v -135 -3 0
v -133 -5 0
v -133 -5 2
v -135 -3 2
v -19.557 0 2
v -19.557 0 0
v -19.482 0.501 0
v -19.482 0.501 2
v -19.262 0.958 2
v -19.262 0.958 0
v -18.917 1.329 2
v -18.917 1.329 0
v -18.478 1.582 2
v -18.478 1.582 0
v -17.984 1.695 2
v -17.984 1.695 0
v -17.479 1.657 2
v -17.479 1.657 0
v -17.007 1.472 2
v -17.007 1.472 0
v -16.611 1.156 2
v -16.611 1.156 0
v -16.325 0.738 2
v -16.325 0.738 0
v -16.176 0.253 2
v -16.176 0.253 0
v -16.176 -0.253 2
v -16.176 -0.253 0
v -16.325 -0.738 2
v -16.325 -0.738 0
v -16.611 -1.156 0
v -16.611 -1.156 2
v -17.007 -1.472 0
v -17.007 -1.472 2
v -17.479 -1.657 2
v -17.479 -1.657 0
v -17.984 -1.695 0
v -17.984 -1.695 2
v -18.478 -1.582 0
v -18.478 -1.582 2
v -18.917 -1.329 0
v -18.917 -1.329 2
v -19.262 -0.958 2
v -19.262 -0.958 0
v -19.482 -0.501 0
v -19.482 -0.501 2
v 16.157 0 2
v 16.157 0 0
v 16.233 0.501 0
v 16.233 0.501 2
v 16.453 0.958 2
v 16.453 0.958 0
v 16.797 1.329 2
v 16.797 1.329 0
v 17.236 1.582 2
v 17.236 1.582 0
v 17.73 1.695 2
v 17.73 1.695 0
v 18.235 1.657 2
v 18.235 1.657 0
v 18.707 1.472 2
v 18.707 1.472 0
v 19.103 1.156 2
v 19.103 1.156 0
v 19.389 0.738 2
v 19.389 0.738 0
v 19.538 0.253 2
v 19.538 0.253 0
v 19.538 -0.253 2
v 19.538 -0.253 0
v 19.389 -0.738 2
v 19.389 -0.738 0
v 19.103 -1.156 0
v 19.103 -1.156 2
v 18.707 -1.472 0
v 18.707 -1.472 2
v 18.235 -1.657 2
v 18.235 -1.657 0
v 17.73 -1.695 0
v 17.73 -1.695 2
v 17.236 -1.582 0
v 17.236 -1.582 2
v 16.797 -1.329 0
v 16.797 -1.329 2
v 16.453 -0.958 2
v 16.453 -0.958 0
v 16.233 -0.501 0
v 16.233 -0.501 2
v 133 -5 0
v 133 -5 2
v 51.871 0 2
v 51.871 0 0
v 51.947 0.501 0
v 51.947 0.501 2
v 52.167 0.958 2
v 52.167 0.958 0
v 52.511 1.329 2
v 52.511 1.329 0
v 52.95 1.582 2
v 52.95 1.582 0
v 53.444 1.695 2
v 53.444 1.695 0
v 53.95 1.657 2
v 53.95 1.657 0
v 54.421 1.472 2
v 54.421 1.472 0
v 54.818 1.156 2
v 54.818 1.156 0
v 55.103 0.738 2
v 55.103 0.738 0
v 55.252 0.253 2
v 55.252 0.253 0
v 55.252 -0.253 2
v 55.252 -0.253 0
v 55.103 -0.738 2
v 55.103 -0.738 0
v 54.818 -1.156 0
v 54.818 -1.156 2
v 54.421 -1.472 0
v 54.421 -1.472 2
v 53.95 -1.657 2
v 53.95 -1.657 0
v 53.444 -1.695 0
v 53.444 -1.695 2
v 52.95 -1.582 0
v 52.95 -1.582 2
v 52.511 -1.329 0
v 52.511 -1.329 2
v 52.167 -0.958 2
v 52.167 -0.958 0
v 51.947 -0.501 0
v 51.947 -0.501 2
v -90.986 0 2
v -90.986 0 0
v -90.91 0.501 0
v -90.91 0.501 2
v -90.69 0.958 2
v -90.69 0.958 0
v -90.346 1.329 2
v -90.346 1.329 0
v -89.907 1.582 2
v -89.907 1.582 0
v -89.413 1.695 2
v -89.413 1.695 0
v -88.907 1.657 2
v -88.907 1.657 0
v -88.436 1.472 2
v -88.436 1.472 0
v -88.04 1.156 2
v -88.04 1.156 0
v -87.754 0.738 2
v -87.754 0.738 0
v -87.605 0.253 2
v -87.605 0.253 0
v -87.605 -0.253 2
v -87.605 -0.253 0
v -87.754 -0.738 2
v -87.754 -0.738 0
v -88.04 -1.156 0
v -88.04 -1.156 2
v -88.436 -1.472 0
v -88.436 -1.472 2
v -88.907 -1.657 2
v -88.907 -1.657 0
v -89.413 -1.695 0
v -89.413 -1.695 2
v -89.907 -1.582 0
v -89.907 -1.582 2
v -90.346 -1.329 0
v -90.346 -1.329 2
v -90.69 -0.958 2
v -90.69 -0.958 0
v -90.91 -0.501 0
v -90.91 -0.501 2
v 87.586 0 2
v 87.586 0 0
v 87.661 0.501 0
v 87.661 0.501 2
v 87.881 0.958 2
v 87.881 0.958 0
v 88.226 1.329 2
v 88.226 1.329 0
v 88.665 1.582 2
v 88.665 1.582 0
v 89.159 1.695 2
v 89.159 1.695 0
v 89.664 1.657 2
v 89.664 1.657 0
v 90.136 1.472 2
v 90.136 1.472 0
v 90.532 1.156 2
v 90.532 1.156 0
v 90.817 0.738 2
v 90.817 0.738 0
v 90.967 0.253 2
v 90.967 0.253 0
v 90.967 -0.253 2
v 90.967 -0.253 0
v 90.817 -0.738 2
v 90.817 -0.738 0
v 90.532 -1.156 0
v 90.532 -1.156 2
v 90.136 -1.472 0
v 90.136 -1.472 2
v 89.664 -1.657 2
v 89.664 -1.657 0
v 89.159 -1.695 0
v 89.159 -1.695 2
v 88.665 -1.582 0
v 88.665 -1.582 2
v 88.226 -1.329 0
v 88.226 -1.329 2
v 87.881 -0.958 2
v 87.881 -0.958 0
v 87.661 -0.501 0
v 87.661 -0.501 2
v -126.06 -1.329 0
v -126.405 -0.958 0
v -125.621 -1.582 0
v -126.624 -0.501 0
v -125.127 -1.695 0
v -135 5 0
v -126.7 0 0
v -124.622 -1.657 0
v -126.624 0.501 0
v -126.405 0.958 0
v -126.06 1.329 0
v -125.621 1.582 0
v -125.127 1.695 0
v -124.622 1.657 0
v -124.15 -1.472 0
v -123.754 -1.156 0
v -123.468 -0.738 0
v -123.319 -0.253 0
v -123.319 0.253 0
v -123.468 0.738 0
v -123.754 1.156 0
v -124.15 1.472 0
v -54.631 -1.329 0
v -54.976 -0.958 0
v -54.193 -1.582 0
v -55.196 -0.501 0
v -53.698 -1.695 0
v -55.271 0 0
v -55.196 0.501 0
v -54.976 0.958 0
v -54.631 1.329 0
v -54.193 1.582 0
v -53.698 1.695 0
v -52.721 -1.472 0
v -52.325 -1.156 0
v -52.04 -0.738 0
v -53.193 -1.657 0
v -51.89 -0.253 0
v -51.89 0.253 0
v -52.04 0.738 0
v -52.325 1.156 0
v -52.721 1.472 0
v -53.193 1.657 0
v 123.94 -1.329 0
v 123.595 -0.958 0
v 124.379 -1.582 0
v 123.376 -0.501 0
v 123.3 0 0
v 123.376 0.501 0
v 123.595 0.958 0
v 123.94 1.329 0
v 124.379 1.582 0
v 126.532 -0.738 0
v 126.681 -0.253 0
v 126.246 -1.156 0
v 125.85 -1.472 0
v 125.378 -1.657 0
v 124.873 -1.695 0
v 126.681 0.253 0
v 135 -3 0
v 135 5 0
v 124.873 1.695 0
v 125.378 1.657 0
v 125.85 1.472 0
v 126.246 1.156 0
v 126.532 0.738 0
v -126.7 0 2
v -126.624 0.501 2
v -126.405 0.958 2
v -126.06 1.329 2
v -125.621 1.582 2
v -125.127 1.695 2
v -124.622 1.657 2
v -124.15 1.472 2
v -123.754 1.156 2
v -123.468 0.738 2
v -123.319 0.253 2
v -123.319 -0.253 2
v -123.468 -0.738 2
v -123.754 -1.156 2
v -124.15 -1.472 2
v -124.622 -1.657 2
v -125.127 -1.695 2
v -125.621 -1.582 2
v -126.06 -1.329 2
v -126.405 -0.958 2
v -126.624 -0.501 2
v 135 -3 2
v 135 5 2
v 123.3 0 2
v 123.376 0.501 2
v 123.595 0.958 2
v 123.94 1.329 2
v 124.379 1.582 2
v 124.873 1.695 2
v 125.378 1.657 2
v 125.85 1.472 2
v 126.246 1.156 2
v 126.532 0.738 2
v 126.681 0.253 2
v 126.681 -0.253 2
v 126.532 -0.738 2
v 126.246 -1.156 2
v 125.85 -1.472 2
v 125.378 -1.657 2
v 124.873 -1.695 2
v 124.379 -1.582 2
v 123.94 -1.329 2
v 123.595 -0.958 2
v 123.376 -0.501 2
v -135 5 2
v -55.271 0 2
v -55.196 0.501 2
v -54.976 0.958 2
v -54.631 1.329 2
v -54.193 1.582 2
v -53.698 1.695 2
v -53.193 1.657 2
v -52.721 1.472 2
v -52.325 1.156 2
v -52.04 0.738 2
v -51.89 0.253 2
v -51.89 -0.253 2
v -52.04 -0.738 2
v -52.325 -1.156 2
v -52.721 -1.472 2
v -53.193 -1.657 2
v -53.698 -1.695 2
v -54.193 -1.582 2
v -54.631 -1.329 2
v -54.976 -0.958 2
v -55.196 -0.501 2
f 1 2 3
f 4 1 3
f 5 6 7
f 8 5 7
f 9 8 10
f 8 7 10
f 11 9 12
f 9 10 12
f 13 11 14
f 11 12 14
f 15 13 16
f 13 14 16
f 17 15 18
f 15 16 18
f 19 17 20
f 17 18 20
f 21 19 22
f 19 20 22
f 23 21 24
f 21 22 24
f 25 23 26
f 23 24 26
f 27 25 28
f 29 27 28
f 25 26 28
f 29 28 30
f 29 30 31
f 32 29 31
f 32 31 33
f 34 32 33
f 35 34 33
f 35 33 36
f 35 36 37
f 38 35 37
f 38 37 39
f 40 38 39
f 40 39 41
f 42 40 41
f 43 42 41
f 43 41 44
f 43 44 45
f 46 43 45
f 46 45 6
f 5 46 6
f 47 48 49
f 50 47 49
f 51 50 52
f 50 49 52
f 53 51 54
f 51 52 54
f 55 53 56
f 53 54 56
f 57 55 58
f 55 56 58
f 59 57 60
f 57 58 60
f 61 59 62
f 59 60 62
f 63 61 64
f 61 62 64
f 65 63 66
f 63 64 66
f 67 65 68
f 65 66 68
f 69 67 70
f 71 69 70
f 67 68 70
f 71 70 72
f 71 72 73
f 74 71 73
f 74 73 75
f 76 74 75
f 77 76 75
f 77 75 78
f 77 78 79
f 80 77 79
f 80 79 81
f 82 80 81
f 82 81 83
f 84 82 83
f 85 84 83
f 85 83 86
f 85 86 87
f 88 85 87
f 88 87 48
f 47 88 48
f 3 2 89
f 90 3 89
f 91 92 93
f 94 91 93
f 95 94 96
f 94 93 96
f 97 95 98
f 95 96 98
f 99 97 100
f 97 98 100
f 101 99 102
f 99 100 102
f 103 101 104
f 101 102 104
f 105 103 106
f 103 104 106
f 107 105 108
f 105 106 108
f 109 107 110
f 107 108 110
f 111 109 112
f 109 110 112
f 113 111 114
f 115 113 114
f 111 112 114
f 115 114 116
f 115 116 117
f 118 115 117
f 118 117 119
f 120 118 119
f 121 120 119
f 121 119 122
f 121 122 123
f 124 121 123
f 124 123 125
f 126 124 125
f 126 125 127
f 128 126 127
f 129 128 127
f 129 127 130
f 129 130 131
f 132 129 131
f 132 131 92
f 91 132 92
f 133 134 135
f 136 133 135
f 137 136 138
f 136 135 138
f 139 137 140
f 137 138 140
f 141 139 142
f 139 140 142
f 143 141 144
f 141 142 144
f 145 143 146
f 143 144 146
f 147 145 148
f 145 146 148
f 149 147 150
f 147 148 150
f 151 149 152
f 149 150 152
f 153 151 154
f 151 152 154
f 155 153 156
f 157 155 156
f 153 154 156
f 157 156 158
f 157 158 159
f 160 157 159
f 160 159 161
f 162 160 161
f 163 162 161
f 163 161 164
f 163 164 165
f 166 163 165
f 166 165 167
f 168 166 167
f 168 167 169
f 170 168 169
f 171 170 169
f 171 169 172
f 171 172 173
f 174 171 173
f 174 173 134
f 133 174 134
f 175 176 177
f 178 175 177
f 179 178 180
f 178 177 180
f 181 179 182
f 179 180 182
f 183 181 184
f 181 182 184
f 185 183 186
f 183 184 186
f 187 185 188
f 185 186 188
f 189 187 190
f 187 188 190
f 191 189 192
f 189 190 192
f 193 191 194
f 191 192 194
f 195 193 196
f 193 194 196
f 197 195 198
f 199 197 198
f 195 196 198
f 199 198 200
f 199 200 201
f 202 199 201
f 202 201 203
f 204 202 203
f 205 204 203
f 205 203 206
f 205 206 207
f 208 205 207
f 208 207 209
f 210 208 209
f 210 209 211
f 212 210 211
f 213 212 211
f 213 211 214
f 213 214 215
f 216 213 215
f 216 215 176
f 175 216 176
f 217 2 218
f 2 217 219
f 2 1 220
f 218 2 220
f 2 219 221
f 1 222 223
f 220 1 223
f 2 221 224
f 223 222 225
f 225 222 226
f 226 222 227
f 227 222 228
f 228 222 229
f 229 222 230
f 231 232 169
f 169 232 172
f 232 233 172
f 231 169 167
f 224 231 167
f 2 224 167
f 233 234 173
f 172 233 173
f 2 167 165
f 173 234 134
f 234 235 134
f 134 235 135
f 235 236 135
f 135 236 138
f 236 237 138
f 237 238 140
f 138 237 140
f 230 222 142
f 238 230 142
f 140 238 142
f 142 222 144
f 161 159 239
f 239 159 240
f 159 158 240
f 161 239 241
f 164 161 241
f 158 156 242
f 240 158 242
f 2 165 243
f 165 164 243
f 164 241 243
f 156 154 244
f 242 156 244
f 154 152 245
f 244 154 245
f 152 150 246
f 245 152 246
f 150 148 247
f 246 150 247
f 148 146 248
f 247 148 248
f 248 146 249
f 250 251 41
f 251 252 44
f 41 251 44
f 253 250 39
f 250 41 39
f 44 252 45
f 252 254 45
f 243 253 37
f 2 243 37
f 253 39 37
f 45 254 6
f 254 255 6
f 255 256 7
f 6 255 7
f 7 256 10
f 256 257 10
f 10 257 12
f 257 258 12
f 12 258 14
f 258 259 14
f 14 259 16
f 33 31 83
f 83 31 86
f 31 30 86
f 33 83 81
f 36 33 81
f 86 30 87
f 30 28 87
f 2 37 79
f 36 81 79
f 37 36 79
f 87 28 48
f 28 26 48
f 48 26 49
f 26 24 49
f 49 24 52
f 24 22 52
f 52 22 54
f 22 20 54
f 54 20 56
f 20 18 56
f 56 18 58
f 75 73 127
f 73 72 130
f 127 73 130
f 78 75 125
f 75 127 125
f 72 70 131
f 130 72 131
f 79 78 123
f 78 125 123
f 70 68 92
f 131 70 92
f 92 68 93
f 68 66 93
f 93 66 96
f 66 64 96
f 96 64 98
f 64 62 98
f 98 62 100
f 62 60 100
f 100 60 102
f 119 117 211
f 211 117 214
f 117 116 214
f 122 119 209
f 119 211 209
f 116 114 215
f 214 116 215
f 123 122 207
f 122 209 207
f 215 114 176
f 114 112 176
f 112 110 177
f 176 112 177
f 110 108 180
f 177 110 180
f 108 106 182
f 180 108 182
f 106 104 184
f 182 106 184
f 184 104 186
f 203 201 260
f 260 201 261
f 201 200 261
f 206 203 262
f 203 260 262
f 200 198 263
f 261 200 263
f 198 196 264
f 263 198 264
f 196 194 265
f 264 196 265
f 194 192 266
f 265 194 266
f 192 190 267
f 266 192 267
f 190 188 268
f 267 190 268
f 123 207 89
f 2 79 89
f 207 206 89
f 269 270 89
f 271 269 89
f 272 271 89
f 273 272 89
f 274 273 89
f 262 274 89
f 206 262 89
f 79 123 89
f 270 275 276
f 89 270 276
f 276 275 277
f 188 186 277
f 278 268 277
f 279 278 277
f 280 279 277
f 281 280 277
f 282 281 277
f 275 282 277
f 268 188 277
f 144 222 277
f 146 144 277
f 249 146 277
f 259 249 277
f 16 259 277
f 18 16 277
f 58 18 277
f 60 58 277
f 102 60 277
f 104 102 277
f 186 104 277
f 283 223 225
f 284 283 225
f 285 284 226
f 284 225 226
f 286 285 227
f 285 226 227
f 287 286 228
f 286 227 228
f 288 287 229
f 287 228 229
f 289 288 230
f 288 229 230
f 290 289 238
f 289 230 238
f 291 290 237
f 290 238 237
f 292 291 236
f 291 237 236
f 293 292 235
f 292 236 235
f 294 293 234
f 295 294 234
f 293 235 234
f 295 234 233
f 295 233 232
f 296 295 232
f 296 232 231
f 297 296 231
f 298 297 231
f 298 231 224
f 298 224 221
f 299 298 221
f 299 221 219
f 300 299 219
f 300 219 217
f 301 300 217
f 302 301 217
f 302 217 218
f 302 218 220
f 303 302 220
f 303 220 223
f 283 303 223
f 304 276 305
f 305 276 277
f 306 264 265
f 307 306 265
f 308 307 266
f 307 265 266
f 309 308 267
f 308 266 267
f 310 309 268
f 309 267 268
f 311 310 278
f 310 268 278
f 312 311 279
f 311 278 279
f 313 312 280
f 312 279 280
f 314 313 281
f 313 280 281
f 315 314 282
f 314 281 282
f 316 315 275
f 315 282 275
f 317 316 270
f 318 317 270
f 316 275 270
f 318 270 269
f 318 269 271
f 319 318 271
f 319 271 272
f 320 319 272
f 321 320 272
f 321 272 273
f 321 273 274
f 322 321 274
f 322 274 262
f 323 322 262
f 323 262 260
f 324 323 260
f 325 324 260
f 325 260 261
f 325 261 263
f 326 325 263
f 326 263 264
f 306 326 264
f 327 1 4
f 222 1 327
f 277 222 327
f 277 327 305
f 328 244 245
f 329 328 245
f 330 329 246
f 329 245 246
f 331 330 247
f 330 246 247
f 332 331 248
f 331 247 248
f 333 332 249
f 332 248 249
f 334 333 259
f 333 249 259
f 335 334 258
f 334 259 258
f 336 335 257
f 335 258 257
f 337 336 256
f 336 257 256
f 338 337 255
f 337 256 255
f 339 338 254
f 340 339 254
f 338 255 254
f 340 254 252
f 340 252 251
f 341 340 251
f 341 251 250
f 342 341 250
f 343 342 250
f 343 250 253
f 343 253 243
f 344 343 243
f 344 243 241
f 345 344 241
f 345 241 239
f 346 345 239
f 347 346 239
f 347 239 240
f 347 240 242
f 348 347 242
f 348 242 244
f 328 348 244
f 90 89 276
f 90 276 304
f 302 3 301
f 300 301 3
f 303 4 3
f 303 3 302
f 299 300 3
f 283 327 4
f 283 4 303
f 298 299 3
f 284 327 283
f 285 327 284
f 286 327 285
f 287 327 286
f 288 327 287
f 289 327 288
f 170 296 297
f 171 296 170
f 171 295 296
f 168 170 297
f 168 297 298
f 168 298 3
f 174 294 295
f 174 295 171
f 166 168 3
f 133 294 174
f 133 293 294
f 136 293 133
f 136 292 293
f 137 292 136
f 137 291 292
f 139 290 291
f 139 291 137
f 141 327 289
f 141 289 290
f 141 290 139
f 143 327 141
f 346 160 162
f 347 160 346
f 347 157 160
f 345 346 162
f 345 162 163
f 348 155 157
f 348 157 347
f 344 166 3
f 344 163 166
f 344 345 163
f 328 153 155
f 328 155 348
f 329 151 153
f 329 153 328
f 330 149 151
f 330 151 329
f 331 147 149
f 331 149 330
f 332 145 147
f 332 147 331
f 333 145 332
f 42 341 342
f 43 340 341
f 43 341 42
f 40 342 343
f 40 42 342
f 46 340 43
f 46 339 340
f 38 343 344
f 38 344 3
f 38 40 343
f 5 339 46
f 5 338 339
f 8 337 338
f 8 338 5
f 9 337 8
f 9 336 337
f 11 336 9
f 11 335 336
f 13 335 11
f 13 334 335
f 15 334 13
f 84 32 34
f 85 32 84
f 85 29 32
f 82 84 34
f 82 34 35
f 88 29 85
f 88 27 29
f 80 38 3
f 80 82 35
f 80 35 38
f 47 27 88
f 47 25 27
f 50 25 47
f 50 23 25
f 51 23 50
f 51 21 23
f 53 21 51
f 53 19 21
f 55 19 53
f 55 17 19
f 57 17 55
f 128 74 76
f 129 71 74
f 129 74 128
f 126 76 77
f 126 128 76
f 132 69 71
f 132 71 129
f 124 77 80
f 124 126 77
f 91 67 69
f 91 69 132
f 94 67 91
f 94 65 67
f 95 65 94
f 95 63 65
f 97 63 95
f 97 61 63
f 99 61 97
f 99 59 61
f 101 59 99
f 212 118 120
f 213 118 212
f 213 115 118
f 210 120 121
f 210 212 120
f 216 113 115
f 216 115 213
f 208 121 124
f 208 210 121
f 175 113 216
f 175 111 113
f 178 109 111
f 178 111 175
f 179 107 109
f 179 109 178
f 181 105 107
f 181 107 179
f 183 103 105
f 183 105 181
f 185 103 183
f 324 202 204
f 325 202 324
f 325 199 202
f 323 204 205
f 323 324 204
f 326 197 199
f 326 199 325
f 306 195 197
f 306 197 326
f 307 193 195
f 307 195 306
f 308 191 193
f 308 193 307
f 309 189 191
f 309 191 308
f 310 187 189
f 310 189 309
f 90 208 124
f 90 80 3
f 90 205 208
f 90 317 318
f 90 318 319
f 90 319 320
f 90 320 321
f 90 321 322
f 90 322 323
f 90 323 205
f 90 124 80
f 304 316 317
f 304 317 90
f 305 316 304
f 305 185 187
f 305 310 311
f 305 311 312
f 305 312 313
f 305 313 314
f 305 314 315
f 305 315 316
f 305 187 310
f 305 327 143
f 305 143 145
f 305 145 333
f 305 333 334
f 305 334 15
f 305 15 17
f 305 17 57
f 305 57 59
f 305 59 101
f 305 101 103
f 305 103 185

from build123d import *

# Parameters (mm, degrees)
SKETCH1_W            = 270
SKETCH1_H            = 10
BOSS_EXTRUDE1_DEPTH  = 2
CHAMFER1_SIZE        = 2
M3_CLEARANCE_HOLE1_D = 3.4
LPATTERN1_COUNT      = 8
LPATTERN1_PITCH      = 35.714285714


with BuildPart() as part:
    # Sketch1 → Boss-Extrude1 (new body)
    with BuildSketch(Plane.XY):
        Rectangle(SKETCH1_W, SKETCH1_H)
    extrude(amount=BOSS_EXTRUDE1_DEPTH)

    # Chamfer1
    chamfer1_edges = [part.edges().sort_by_distance(p)[0] for p in [
        (135, -5, 1),
        (-135, -5, 1),
    ]]
    chamfer(chamfer1_edges, length=CHAMFER1_SIZE)

    # M3 Clearance Hole1 (through all)
    with Locations(Plane.XY.offset(2)):
        with Locations((125, 0)):
            m3_clearance_hole1 = Hole(M3_CLEARANCE_HOLE1_D / 2)

    # LPattern1: M3 Clearance Hole1 ×8
    with Locations(*[(-i * LPATTERN1_PITCH, 0, 0) for i in range(1, LPATTERN1_COUNT)]):
        add(m3_clearance_hole1, mode=Mode.SUBTRACT)


solid = part.part
